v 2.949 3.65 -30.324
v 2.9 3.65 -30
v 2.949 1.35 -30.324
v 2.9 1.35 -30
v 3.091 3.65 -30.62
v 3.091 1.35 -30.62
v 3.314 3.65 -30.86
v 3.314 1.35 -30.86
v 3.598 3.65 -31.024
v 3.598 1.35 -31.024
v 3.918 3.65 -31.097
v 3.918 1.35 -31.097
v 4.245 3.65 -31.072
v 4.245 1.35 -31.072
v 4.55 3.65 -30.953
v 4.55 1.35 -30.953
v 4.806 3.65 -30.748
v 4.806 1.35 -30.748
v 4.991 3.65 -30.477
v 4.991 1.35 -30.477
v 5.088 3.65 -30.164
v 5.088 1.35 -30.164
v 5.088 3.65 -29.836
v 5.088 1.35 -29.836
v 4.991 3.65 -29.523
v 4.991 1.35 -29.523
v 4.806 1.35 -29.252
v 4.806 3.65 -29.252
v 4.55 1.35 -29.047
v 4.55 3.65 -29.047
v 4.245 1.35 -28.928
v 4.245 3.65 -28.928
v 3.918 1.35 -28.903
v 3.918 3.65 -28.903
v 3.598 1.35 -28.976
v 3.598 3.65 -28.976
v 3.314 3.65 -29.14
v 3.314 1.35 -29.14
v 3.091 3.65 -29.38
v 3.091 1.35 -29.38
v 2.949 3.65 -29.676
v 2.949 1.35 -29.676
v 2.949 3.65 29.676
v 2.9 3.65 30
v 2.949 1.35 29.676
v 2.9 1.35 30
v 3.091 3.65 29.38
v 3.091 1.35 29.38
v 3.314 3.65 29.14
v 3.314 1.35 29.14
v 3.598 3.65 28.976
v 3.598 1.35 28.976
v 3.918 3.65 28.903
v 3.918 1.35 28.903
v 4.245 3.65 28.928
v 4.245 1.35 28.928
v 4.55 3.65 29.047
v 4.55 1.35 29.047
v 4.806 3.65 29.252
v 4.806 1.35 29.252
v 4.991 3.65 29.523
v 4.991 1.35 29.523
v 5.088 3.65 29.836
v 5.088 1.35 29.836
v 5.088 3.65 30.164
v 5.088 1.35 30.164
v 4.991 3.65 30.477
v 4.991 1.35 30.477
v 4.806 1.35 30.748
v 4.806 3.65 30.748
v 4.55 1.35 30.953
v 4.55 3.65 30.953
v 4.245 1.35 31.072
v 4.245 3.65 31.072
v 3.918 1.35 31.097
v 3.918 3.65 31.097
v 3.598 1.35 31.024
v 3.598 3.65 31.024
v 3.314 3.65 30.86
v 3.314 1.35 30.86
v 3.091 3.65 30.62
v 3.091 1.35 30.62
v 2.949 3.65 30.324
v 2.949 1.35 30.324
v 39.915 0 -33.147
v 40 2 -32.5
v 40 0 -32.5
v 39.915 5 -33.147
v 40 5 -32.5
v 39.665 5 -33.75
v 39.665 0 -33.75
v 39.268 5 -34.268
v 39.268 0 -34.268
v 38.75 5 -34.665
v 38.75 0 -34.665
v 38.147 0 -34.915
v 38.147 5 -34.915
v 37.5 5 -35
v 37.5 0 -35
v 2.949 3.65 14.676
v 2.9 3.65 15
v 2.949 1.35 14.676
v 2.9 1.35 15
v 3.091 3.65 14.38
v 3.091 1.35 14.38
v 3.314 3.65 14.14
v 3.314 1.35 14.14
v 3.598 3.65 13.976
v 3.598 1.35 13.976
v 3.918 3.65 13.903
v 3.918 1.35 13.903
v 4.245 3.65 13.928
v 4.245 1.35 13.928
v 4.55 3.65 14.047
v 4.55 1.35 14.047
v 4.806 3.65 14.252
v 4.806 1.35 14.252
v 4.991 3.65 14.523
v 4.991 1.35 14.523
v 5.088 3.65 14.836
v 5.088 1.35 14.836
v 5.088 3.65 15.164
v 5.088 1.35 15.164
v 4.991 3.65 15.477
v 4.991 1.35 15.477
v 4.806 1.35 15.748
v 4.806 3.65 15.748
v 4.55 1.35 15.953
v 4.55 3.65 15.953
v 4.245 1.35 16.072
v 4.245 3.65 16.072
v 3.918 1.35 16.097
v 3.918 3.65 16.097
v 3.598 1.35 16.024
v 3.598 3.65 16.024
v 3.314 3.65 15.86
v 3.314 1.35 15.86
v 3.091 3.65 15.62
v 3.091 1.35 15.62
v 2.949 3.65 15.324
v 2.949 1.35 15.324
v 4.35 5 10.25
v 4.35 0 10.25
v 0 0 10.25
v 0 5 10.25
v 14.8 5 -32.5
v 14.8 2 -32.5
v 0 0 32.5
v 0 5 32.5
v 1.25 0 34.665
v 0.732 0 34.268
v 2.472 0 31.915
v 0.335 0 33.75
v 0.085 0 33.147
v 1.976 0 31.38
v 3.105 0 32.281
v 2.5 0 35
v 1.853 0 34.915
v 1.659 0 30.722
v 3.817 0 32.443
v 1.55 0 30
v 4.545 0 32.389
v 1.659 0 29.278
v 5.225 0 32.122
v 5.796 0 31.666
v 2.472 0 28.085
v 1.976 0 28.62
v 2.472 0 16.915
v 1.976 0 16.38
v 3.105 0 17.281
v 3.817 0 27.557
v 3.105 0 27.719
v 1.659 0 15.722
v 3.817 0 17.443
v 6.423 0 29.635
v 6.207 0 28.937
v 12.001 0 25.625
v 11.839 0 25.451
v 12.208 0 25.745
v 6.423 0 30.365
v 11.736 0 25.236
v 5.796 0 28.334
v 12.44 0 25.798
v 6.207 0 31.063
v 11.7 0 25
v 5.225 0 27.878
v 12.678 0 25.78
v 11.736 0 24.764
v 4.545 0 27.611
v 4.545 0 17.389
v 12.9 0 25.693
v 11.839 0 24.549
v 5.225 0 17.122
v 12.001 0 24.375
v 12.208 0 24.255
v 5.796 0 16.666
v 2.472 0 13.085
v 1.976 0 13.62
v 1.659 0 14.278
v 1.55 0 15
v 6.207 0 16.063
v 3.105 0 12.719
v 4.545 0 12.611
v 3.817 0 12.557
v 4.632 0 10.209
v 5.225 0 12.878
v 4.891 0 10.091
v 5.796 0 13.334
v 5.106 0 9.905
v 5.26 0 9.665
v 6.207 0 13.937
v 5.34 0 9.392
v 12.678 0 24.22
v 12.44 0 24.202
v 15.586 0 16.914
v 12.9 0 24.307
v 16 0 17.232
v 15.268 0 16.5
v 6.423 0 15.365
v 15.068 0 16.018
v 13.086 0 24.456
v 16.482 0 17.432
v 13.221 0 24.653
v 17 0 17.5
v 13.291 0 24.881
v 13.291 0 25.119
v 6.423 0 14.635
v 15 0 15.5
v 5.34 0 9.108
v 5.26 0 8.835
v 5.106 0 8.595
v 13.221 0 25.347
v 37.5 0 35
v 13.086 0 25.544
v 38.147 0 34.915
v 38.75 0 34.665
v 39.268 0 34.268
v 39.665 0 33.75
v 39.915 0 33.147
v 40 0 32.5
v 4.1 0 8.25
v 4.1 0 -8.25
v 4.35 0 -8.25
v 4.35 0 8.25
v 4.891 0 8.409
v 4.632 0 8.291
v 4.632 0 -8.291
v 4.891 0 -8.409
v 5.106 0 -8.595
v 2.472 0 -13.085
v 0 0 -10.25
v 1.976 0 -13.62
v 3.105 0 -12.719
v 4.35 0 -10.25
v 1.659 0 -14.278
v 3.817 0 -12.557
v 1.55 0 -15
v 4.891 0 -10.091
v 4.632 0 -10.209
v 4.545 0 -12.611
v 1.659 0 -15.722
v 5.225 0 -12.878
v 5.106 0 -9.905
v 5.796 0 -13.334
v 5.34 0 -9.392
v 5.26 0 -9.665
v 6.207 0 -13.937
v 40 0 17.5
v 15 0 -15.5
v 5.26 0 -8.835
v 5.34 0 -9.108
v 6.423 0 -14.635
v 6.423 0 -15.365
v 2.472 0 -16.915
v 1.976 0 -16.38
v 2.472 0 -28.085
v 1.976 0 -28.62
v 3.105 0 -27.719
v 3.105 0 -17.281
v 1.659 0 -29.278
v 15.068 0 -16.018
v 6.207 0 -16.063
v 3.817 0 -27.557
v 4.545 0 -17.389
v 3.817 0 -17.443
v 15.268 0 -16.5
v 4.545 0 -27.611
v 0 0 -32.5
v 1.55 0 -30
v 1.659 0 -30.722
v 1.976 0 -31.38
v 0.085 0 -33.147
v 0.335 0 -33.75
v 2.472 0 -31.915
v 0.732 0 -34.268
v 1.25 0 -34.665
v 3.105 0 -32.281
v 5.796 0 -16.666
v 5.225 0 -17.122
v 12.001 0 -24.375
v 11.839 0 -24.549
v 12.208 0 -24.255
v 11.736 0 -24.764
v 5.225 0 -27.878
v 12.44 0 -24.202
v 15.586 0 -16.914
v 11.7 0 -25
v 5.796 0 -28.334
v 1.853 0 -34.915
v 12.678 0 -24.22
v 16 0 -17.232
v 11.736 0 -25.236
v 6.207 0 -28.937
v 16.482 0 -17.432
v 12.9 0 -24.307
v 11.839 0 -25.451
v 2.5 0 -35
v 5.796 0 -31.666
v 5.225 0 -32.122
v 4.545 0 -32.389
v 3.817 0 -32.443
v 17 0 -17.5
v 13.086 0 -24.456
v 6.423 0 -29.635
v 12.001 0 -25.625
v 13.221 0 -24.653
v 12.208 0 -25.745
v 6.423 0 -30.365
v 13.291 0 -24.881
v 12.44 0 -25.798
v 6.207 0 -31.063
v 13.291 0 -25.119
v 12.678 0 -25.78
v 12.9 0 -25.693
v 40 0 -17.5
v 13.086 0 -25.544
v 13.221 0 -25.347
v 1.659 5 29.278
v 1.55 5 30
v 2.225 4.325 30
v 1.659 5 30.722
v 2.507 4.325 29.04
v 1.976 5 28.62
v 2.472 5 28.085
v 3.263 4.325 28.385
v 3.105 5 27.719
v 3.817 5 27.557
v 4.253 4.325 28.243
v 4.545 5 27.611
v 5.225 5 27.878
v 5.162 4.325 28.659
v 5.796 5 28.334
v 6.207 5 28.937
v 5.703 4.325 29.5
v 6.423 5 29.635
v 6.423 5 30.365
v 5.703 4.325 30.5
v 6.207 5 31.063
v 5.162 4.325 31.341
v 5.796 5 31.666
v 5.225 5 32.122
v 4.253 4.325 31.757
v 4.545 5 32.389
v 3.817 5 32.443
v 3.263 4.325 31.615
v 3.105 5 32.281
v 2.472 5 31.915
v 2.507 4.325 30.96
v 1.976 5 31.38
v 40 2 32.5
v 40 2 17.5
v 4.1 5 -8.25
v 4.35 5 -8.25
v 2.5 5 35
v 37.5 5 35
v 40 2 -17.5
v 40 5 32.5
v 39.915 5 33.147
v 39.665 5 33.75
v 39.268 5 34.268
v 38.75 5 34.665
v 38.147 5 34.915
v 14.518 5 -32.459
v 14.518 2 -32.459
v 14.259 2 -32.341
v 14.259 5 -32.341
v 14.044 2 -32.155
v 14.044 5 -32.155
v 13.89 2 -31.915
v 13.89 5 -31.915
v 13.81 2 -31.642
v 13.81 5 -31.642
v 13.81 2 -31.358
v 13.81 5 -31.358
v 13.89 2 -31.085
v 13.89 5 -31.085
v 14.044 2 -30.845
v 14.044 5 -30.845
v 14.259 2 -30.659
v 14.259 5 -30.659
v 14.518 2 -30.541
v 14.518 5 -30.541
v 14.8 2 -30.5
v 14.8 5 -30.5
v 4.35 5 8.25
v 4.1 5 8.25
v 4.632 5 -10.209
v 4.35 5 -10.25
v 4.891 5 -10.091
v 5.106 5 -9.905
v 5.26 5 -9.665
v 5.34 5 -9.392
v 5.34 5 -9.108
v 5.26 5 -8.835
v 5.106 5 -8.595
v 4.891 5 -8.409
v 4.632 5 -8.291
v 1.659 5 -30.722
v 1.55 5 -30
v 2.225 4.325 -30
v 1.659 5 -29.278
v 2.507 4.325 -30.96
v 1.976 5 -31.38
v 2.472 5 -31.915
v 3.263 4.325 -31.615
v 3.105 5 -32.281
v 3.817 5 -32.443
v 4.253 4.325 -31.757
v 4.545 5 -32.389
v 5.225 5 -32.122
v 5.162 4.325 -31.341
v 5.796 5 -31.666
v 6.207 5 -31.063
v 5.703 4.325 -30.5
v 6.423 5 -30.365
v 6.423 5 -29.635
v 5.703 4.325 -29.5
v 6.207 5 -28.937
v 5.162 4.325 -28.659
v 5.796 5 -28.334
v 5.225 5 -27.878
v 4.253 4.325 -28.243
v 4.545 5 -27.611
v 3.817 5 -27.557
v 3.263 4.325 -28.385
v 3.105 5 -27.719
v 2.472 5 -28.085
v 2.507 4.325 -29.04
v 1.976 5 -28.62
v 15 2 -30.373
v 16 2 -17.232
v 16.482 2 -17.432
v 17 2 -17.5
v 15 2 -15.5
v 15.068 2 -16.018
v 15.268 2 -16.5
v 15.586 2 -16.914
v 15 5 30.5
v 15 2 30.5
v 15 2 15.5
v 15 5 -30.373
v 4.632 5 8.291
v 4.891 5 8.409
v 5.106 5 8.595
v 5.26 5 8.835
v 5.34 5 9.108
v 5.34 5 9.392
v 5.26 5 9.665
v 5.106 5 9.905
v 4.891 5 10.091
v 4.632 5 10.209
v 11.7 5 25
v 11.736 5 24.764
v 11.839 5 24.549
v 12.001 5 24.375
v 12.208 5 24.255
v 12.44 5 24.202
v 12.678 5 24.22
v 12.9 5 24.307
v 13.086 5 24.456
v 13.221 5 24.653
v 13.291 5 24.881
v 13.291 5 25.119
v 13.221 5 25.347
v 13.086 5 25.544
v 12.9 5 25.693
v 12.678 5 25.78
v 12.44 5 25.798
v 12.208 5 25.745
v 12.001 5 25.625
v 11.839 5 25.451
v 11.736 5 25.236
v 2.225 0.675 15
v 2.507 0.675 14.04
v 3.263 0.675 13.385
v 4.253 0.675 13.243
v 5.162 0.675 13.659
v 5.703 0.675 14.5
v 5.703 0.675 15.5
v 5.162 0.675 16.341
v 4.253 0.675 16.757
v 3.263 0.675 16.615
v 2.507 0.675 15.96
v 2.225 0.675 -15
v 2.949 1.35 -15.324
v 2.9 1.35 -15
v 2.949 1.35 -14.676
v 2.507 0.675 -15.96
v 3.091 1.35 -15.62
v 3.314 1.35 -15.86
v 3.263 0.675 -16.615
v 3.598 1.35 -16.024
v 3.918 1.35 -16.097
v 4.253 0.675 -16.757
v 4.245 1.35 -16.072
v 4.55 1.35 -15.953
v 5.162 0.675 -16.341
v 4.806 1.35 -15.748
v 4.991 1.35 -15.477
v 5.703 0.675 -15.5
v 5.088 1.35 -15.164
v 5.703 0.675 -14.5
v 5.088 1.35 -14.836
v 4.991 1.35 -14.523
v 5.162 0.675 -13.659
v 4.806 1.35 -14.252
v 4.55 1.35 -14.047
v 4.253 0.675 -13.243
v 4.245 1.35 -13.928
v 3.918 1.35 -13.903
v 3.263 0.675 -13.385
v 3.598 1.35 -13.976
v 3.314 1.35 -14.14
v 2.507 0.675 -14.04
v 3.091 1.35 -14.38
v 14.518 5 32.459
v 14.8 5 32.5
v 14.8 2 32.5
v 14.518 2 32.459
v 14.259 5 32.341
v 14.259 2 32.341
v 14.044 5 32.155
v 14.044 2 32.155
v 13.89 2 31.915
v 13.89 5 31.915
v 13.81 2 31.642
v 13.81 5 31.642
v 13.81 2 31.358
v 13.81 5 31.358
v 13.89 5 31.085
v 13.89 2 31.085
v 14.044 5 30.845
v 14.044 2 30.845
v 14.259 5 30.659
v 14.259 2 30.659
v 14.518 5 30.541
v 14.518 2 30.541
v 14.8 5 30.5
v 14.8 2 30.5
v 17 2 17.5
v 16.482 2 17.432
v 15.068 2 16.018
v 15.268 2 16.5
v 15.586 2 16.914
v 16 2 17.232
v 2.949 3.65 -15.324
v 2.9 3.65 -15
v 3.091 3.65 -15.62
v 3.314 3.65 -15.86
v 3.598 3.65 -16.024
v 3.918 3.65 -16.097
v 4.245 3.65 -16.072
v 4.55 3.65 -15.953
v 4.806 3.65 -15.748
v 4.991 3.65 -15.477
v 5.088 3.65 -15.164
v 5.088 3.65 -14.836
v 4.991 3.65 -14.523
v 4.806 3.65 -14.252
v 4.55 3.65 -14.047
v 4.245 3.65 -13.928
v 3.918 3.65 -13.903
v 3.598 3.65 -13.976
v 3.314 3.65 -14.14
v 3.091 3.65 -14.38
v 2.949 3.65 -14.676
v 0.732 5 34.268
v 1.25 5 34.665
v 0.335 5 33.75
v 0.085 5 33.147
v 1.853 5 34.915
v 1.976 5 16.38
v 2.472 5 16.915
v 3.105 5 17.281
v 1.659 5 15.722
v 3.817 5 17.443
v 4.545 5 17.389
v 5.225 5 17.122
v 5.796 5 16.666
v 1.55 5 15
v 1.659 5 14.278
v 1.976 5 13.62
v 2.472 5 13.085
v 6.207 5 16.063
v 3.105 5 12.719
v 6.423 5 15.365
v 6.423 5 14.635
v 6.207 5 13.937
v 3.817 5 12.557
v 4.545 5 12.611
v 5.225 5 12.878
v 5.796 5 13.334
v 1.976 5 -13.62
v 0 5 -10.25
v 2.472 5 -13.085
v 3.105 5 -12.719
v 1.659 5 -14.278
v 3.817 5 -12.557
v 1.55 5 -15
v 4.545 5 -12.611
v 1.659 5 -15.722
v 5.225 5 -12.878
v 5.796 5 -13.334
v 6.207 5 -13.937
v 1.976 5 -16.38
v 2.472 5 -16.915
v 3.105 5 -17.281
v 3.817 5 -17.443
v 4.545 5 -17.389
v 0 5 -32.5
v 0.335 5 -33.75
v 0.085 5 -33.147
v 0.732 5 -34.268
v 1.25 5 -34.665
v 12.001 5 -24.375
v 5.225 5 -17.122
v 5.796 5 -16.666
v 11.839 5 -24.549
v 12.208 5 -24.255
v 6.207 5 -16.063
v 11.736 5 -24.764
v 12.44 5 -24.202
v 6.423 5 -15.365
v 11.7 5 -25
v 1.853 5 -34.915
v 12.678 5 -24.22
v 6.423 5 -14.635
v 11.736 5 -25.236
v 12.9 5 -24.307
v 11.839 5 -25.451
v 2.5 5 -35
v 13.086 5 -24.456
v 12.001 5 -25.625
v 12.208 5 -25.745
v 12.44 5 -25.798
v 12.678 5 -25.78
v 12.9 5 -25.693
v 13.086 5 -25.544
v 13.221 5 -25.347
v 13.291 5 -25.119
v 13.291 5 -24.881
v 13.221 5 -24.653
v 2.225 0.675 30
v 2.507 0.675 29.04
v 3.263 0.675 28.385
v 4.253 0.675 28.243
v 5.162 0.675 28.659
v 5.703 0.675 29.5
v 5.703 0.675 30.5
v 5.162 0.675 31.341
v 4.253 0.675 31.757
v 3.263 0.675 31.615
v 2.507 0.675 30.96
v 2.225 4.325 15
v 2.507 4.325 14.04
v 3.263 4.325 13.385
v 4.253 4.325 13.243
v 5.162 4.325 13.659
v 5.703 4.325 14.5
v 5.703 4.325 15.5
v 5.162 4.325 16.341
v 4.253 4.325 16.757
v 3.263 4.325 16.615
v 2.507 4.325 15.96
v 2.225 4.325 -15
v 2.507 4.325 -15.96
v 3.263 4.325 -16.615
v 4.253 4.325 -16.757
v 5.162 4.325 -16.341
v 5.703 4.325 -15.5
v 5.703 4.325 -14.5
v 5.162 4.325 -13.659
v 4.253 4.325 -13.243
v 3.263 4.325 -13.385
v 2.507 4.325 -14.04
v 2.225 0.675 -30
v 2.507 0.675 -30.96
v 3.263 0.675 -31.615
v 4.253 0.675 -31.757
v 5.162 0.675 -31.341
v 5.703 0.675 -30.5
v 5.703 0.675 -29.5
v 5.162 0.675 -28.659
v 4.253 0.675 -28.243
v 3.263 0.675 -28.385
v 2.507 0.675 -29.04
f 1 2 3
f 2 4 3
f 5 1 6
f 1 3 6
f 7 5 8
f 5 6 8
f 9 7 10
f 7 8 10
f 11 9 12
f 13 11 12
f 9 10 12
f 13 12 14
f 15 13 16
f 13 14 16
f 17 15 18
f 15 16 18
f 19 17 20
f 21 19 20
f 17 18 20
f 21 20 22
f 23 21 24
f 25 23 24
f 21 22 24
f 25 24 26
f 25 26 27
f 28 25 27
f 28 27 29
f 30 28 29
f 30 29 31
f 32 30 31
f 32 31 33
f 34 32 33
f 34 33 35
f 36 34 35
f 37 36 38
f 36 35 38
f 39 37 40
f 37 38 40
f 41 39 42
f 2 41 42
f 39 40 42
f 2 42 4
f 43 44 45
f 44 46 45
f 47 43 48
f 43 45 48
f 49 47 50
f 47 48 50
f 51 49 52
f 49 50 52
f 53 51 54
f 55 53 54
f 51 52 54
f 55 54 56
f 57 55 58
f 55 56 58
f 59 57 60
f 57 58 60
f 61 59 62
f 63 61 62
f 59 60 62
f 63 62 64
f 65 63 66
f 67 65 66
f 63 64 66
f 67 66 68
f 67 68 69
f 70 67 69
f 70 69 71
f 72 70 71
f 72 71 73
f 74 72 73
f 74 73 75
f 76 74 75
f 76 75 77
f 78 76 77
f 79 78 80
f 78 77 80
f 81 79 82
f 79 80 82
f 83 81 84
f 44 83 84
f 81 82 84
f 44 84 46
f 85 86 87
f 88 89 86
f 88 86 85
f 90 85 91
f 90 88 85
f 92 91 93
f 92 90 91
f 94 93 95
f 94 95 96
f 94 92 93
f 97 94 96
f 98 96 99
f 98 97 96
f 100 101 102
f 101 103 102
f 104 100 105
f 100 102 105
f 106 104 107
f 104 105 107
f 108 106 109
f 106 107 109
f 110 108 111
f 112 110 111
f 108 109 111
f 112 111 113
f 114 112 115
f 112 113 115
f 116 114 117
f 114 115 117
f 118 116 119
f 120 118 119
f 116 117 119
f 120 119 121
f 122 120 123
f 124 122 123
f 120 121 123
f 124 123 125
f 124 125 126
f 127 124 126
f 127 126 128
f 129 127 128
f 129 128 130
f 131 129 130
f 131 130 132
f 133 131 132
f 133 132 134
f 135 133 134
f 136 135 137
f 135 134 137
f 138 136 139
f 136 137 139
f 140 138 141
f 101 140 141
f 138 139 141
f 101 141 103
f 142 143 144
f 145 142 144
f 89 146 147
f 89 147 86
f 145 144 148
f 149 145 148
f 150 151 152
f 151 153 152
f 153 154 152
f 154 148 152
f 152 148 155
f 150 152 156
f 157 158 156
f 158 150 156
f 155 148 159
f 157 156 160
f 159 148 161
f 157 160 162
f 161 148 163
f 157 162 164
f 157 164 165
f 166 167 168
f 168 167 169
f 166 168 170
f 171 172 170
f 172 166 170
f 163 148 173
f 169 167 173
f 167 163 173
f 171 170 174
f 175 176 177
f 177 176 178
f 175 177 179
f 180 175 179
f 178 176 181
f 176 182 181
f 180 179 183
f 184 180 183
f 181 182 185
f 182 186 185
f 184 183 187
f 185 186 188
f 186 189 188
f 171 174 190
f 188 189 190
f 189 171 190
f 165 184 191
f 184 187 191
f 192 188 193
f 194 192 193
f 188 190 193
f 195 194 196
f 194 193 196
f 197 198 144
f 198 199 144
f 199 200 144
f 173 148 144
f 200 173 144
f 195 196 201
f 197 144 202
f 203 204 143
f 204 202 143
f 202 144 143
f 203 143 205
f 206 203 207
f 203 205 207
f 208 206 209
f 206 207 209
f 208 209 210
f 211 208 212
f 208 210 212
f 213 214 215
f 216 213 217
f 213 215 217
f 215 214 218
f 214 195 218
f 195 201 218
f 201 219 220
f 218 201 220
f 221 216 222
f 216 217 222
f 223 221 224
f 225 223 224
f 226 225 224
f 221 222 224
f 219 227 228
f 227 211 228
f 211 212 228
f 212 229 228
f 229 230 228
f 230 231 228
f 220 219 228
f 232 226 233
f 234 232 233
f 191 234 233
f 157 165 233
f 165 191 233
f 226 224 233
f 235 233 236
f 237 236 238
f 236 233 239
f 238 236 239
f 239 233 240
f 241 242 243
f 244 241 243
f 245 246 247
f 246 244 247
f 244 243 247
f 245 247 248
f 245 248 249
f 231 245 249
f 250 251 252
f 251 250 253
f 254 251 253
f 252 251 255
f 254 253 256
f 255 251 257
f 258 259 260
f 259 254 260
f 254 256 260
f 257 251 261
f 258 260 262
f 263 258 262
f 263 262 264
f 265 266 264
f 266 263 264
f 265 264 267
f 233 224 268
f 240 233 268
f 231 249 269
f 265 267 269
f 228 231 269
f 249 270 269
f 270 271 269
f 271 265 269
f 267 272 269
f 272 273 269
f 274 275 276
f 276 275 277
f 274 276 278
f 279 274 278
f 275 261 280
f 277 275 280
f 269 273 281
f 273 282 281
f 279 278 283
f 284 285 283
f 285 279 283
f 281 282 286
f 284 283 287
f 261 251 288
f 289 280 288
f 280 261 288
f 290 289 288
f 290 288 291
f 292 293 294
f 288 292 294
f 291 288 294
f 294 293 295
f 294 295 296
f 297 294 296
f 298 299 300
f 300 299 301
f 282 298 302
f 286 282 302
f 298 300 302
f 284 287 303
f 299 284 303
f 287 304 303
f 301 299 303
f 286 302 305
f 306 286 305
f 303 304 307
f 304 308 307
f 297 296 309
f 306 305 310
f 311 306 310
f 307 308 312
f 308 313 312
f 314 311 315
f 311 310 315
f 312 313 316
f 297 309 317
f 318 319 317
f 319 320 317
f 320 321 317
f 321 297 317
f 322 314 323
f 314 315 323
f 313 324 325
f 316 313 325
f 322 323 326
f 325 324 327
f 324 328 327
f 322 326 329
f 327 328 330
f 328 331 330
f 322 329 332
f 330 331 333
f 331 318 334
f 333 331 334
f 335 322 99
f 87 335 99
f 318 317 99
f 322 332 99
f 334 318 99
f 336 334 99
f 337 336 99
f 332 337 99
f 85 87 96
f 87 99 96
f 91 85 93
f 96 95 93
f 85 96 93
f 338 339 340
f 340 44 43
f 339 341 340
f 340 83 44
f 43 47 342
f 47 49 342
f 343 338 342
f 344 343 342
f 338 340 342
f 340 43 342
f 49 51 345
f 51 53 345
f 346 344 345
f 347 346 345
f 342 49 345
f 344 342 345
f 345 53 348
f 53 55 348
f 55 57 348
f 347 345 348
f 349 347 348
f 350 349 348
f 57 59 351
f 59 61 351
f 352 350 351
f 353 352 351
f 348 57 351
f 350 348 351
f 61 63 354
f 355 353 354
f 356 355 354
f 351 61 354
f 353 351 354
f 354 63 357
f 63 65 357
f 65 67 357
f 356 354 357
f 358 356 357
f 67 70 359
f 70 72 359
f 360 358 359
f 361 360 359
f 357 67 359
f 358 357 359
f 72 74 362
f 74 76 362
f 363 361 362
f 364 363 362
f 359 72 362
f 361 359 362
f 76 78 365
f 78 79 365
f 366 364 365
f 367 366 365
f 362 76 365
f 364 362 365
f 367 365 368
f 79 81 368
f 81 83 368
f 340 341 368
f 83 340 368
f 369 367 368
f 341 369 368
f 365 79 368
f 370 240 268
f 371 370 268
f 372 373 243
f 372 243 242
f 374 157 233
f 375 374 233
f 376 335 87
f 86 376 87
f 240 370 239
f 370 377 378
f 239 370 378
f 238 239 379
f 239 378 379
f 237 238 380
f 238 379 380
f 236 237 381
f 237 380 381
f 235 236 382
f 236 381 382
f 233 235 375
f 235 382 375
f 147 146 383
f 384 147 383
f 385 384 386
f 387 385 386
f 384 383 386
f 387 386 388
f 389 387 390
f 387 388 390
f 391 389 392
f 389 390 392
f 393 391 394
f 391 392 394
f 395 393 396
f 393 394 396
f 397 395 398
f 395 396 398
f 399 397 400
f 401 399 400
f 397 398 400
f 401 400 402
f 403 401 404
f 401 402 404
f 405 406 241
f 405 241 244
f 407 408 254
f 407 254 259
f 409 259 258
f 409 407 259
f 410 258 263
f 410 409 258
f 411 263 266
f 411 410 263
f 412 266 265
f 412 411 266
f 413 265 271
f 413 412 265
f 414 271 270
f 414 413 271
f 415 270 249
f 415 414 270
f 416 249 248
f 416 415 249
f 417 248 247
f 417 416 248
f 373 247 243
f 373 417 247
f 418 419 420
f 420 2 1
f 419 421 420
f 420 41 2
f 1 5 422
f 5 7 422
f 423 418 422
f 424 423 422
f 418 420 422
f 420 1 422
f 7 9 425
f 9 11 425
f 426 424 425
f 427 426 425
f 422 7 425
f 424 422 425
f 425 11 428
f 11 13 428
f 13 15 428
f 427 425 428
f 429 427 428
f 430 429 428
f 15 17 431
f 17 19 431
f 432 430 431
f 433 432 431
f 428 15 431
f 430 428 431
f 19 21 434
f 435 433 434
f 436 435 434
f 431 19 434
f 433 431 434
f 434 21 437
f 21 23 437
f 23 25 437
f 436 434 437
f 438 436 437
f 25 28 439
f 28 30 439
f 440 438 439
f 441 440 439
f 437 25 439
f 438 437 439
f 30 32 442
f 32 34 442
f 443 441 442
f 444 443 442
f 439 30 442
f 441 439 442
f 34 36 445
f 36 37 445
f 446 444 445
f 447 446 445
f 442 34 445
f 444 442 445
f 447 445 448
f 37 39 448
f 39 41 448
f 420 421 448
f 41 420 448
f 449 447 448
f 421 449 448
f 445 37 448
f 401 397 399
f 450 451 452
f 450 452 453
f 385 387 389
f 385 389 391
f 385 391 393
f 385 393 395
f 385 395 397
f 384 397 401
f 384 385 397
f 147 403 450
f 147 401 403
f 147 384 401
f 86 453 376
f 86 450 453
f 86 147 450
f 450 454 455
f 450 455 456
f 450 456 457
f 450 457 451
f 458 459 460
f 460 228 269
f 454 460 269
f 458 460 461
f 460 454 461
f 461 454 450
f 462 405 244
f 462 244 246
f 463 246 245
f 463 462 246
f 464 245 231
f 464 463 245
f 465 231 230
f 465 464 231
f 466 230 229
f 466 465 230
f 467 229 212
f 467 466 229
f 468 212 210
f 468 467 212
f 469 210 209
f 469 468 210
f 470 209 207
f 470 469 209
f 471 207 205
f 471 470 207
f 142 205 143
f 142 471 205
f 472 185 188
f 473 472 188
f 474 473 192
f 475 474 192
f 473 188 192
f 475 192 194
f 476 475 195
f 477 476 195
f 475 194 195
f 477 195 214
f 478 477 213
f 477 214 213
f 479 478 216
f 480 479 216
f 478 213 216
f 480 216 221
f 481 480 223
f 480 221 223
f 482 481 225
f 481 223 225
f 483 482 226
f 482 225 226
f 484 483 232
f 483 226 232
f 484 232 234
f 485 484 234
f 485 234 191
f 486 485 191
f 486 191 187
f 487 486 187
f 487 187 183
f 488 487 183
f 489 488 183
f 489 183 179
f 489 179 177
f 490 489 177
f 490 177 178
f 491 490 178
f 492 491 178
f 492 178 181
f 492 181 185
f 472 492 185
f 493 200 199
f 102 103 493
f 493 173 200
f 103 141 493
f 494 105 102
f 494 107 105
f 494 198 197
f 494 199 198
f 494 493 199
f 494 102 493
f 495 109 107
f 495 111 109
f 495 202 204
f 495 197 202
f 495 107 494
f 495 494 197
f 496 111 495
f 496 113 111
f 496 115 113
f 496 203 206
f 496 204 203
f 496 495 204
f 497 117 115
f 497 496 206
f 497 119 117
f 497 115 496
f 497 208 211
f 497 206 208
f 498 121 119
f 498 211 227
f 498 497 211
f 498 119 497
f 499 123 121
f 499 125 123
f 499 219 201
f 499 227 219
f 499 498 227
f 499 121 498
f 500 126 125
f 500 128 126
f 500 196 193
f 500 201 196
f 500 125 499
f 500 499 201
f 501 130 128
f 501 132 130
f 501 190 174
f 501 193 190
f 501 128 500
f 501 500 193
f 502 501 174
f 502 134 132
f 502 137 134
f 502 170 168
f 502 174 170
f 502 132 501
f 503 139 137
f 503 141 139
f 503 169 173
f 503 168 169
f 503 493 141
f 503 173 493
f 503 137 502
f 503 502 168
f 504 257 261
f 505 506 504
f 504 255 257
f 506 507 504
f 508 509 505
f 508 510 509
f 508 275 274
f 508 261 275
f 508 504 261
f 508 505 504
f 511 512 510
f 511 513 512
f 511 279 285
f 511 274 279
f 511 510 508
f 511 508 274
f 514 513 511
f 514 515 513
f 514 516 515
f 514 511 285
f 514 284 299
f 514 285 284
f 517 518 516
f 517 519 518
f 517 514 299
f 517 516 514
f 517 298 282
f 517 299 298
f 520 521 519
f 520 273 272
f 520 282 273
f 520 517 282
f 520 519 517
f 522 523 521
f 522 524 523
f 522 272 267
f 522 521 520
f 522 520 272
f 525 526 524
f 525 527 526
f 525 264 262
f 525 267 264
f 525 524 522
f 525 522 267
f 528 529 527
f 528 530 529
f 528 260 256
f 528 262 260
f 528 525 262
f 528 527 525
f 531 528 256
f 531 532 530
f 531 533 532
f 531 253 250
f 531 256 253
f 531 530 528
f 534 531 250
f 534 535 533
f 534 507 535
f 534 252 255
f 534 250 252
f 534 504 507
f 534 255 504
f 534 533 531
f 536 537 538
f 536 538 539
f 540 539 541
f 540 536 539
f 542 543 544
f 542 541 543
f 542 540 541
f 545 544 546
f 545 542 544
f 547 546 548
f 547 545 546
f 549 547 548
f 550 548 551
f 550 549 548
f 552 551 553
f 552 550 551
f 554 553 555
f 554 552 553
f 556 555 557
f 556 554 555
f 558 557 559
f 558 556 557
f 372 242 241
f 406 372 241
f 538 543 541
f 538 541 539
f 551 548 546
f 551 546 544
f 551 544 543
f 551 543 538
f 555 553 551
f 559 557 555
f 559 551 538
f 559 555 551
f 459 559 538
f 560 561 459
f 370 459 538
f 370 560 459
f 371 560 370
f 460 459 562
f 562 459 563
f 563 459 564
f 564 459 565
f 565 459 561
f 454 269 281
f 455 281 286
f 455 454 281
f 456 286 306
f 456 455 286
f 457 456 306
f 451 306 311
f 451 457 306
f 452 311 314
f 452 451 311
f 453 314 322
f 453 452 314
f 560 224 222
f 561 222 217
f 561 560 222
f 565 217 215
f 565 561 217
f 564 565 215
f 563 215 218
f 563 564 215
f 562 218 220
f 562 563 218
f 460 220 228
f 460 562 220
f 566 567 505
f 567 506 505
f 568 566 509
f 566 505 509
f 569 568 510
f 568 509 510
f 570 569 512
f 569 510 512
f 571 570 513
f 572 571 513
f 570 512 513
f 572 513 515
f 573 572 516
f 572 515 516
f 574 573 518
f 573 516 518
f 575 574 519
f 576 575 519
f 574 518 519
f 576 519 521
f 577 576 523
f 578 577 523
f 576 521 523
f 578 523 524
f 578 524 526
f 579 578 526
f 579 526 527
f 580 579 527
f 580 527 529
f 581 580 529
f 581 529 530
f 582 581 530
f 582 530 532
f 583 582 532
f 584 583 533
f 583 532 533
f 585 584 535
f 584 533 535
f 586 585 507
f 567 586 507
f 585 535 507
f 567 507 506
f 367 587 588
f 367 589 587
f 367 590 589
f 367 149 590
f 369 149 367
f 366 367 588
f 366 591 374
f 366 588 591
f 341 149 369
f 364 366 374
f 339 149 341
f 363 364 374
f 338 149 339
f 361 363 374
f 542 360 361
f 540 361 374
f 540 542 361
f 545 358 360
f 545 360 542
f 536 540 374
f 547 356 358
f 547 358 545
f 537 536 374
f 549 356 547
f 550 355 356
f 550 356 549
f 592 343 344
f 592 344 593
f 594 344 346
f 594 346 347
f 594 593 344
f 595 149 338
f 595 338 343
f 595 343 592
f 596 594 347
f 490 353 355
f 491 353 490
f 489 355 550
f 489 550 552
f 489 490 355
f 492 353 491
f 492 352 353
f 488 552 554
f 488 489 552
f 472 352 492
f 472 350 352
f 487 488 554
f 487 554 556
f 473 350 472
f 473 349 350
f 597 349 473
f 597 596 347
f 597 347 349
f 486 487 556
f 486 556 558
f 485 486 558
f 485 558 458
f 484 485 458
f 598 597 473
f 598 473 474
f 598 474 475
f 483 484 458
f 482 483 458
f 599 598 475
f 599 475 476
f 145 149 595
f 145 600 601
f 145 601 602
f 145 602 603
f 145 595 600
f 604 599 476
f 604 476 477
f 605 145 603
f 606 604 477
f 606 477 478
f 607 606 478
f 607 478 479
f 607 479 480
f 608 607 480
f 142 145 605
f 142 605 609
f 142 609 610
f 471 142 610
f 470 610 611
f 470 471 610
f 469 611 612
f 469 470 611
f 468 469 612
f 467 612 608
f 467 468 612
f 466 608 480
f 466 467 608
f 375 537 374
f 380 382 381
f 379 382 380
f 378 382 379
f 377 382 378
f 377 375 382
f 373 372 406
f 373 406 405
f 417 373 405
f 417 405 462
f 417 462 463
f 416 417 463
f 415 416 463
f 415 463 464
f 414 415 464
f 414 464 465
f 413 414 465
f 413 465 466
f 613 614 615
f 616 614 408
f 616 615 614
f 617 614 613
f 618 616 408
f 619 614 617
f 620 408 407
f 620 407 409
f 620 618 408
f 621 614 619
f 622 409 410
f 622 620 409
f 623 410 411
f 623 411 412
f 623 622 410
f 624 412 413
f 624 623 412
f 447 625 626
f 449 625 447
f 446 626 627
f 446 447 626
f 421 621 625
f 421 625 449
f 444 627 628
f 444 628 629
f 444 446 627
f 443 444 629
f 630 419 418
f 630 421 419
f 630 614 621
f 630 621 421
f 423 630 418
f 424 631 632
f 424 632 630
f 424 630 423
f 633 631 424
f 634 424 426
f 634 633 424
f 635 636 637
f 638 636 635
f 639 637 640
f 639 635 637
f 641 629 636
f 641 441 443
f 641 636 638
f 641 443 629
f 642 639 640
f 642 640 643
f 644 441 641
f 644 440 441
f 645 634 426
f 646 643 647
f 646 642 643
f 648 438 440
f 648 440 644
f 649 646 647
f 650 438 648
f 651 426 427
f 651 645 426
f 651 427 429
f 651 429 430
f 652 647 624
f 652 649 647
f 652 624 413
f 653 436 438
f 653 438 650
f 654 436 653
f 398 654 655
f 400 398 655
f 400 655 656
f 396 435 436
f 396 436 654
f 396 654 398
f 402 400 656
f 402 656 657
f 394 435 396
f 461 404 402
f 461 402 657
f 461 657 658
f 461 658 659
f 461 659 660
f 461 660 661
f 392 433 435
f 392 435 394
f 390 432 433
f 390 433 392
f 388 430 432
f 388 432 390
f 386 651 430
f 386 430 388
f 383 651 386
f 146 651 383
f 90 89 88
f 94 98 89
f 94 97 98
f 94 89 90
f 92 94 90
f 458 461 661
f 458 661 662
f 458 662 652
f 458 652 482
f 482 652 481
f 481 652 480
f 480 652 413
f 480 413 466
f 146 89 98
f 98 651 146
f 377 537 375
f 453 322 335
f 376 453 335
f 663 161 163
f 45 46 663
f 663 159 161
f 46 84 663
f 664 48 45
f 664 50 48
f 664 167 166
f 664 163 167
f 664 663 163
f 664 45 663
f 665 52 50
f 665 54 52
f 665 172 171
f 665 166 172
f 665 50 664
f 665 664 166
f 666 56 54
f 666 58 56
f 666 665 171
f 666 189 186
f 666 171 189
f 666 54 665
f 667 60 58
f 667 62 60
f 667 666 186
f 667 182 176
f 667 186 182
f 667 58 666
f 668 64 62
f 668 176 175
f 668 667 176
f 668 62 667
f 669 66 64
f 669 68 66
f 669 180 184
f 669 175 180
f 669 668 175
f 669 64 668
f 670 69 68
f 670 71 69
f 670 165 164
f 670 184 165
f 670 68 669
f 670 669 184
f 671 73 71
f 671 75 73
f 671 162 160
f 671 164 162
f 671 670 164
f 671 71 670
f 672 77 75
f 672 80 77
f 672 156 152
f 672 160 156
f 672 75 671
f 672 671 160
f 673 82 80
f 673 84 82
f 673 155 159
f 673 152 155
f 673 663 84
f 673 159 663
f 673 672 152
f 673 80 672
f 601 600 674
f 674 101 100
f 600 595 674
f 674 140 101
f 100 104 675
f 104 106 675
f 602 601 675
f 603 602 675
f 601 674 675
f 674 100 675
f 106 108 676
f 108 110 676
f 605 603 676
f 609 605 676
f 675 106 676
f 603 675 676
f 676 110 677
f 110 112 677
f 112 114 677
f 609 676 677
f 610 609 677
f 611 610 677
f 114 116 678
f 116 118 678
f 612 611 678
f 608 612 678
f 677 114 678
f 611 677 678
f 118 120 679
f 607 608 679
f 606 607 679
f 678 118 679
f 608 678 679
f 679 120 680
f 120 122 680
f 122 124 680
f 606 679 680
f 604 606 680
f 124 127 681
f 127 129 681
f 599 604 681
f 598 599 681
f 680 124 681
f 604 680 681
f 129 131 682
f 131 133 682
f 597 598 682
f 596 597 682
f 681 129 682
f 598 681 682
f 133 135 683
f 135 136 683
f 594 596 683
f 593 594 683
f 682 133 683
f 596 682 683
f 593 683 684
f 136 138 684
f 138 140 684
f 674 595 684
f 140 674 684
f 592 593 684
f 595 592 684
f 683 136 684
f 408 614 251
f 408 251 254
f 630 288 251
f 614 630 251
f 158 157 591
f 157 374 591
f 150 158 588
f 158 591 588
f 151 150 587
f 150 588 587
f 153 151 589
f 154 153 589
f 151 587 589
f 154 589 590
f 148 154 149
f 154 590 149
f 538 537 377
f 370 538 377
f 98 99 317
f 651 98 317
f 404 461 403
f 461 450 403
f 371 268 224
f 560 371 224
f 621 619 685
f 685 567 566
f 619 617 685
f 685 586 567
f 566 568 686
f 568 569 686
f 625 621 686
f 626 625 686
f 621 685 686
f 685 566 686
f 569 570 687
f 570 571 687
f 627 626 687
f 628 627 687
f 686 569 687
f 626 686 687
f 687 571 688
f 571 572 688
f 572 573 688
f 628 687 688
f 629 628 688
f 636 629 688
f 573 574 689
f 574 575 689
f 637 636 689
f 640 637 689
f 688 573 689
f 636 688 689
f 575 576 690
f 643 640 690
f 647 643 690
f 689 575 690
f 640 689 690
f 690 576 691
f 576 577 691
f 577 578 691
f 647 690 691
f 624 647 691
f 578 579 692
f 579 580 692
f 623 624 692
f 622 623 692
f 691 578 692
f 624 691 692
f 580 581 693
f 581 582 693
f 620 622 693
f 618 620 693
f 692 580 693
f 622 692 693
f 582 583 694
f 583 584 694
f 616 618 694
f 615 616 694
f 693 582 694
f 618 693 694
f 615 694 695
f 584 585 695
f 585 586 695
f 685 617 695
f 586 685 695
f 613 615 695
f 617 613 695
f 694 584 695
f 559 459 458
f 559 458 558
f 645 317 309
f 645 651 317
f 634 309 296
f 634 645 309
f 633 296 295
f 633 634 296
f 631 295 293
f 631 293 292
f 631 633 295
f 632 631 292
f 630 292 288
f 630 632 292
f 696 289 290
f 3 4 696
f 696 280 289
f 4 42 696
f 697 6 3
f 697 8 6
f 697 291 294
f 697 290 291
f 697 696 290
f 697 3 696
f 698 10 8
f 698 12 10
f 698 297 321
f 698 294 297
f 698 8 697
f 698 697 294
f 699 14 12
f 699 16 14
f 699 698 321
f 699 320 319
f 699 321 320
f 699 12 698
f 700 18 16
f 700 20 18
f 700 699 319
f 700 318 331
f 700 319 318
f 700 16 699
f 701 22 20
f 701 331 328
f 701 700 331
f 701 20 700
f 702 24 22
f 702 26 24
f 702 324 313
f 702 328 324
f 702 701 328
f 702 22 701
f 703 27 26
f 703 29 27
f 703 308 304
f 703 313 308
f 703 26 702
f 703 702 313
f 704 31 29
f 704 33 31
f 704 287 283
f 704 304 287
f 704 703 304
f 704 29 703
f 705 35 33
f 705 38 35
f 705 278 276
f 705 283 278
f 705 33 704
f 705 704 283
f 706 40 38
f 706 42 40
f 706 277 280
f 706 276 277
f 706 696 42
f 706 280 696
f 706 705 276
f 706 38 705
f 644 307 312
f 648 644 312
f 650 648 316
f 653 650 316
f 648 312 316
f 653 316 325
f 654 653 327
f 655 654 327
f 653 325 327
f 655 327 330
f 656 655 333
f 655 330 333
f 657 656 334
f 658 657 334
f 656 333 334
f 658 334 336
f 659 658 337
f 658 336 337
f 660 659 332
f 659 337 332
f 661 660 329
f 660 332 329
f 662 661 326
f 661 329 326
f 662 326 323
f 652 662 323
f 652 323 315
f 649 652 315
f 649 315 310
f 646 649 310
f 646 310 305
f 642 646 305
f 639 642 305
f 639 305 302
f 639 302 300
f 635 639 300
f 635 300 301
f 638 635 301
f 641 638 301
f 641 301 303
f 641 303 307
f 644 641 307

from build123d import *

# Parameters (mm, degrees)
BOSS_EXTRUDE1_DEPTH                                 = 5
FILLET1_R                                           = 2
FILLET2_R                                           = 2.5
CUT_EXTRUDE2_REACH                                  = 7
CSK_FOR_M2_COUNTERSUNK_FLAT_HEAD_SCREW1_D           = 2.2
CSK_FOR_M2_COUNTERSUNK_FLAT_HEAD_SCREW1_DEPTH       = 5
CSK_FOR_M2_COUNTERSUNK_FLAT_HEAD_SCREW1_CSINK_D     = 4.9
CSK_FOR_M2_COUNTERSUNK_FLAT_HEAD_SCREW1_CSINK_ANGLE = 90
M2_TAPPED_HOLE1_D                                   = 1.6
M2_TAPPED_HOLE1_DEPTH                               = 5
SKETCH9_W                                           = 25.2
SKETCH9_H                                           = 12.5
CUT_EXTRUDE3_DEPTH                                  = 1.25
CUT_EXTRUDE4_DEPTH                                  = 1.25
SKETCH11_W                                          = 25
SKETCH11_H                                          = 4.5
CUT_EXTRUDE5_DEPTH                                  = 1.25
BOSS_EXTRUDE2_DEPTH                                 = 1.25
CUT_EXTRUDE6_DEPTH                                  = 1.75


with BuildPart() as part:
    # Sketch1 → Boss-Extrude1 (new body)
    with BuildSketch(Plane(origin=(0, 0, 0), x_dir=(1, 0, 0), z_dir=(0, 1, 0))):
        Polygon((0, 35), (0, 10.25), (4.1, 10.25), (4.1, -10.25), (0, -10.25), (0, -35), (40, -35), (40, -17.5), (15, -17.5), (15, 17.5), (40, 17.5), (40, 35), align=None)
    extrude(amount=BOSS_EXTRUDE1_DEPTH)

    # Fillet1
    fillet1_edges = [part.edges().sort_by_distance(p)[0] for p in [
        (15, 2.5, -17.5),
        (15, 2.5, 17.5),
    ]]
    fillet(fillet1_edges, radius=FILLET1_R)

    # Fillet2
    fillet2_edges = [part.edges().sort_by_distance(p)[0] for p in [
        (0, 2.5, -35),
        (40, 2.5, -35),
        (40, 2.5, 35),
        (0, 2.5, 35),
    ]]
    fillet(fillet2_edges, radius=FILLET2_R)

    # Sketch3 → Cut-Extrude2 (cut, up to next)
    with BuildSketch(Plane(origin=(0, 5, 0), x_dir=(1, 0, 0), z_dir=(0, 1, 0)), mode=Mode.PRIVATE) as cut_extrude2_sk1:
        with BuildLine():
            Line((4.1, 10.25), (4.35, 10.25))
            ThreePointArc((4.35, 10.25), (5.35, 9.25), (4.35, 8.25))
            Line((4.35, 8.25), (4.1, 8.25))
            Line((4.1, 8.25), (4.1, 10.25))
        make_face()
    cut_extrude2_tool1 = extrude(cut_extrude2_sk1.sketch, amount=-CUT_EXTRUDE2_REACH, mode=Mode.PRIVATE) & part.part
    add(cut_extrude2_tool1.solids().sort_by_distance((4.641756, 5, -9.25))[0], mode=Mode.SUBTRACT)
    # Sketch3 → Cut-Extrude2 (cut, up to next)
    with BuildSketch(Plane(origin=(0, 5, 0), x_dir=(1, 0, 0), z_dir=(0, 1, 0)), mode=Mode.PRIVATE) as cut_extrude2_sk2:
        with BuildLine():
            Line((4.1, -10.25), (4.1, -8.25))
            Line((4.1, -8.25), (4.35, -8.25))
            ThreePointArc((4.35, -8.25), (5.35, -9.25), (4.35, -10.25))
            Line((4.35, -10.25), (4.1, -10.25))
        make_face()
    cut_extrude2_tool2 = extrude(cut_extrude2_sk2.sketch, amount=-CUT_EXTRUDE2_REACH, mode=Mode.PRIVATE) & part.part
    add(cut_extrude2_tool2.solids().sort_by_distance((4.641756, 5, 9.25))[0], mode=Mode.SUBTRACT)

    # CSK for M2 Countersunk Flat Head Screw1
    with Locations(Plane(origin=(0, 5, 0), x_dir=(1, 0, 0), z_dir=(0, 1, 0))):
        with Locations((4, 30), (4, 15), (4, -15), (4, -30)):
            csk_for_m2_countersunk_flat_head_screw1 = CounterSinkHole(CSK_FOR_M2_COUNTERSUNK_FLAT_HEAD_SCREW1_D / 2, CSK_FOR_M2_COUNTERSUNK_FLAT_HEAD_SCREW1_CSINK_D / 2, depth=CSK_FOR_M2_COUNTERSUNK_FLAT_HEAD_SCREW1_DEPTH, counter_sink_angle=CSK_FOR_M2_COUNTERSUNK_FLAT_HEAD_SCREW1_CSINK_ANGLE)

    # M2 Tapped Hole1
    with Locations(Plane(origin=(0, 5, 0), x_dir=(1, 0, 0), z_dir=(0, 1, 0))):
        with Locations((12.5, -25), (12.5, 25)):
            Hole(M2_TAPPED_HOLE1_D / 2, depth=M2_TAPPED_HOLE1_DEPTH)

    # Sketch9 → Cut-Extrude3 (cut)
    with BuildSketch(Plane(origin=(0, 5, 0), x_dir=(1, 0, 0), z_dir=(0, 1, 0))):
        with Locations((27.4, 26.25)):
            Rectangle(SKETCH9_W, SKETCH9_H)
        with Locations((27.4, -26.25)):
            Rectangle(SKETCH9_W, SKETCH9_H)
    extrude(amount=-CUT_EXTRUDE3_DEPTH, mode=Mode.SUBTRACT)

    # Sketch10 → Cut-Extrude4 (cut)
    with BuildSketch(Plane(origin=(0, 5, 0), x_dir=(1, 0, 0), z_dir=(0, 1, 0))):
        with BuildLine():
            Line((14.8, 22), (14.8, 20))
            ThreePointArc((14.8, 20), (13.8, 21), (14.8, 22))
        make_face()
        with BuildLine():
            Line((14.8, 30.5), (14.8, 32.5))
            ThreePointArc((14.8, 32.5), (13.8, 31.5), (14.8, 30.5))
        make_face()
    cut_extrude4 = extrude(amount=-CUT_EXTRUDE4_DEPTH, mode=Mode.SUBTRACT)

    # Mirror1: CSK for M2 Countersunk Flat Head Screw1 across plane
    add(csk_for_m2_countersunk_flat_head_screw1.mirror(Plane(origin=(0, 2.5, 0), x_dir=(0, 0, 1), z_dir=(0, -1, 0))), mode=Mode.SUBTRACT)

    # Mirror2: Cut-Extrude4 across plane
    add(cut_extrude4.mirror(Plane.XY), mode=Mode.SUBTRACT)

    # Sketch11 → Cut-Extrude5 (cut)
    with BuildSketch(Plane(origin=(0, 5, 0), x_dir=(1, 0, 0), z_dir=(0, 1, 0))):
        with Locations((27.5, 17.75)):
            Rectangle(SKETCH11_W, SKETCH11_H)
        with Locations((27.5, -17.75)):
            Rectangle(SKETCH11_W, SKETCH11_H)
    extrude(amount=-CUT_EXTRUDE5_DEPTH, mode=Mode.SUBTRACT)

    # Sketch12 → Boss-Extrude2 (add)
    with BuildSketch(Plane(origin=(0, 3.75, 0), x_dir=(1, 0, 0), z_dir=(0, 1, 0))):
        with BuildLine():
            Line((14.8, 20), (15, 20))
            Line((15, 20), (15, 30.37258082))
            Line((15, 30.37258082), (14.8, 30.5))
            Line((14.8, 30.5), (14.8, 22))
            ThreePointArc((14.8, 22), (13.8, 21), (14.8, 20))
        make_face()
        with BuildLine():
            Line((14.8, -20), (15, -20))
            Line((15, -20), (15, -30.5))
            Line((15, -30.5), (14.8, -30.5))
            Line((14.8, -30.5), (14.8, -22))
            ThreePointArc((14.8, -22), (13.8, -21), (14.8, -20))
        make_face()
    extrude(amount=BOSS_EXTRUDE2_DEPTH)

    # Sketch13 → Cut-Extrude6 (cut)
    with BuildSketch(Plane(origin=(0, 3.75, 0), x_dir=(1, 0, 0), z_dir=(0, 1, 0))):
        with BuildLine():
            Line((14.8, 30.5), (15, 30.37258082))
            Line((15, 30.37258082), (15, 15.5))
            ThreePointArc((15, 15.5), (15.585786438, 16.914213562), (17, 17.5))
            Line((17, 17.5), (40, 17.5))
            Line((40, 17.5), (40, 32.5))
            Line((40, 32.5), (14.8, 32.5))
            ThreePointArc((14.8, 32.5), (13.8, 31.5), (14.8, 30.5))
        make_face()
        with BuildLine():
            Line((15, -15.5), (15, -30.5))
            Line((15, -30.5), (14.8, -30.5))
            ThreePointArc((14.8, -30.5), (13.8, -31.5), (14.8, -32.5))
            Line((14.8, -32.5), (40, -32.5))
            Line((40, -32.5), (40, -17.5))
            Line((40, -17.5), (17, -17.5))
            ThreePointArc((17, -17.5), (15.585786438, -16.914213562), (15, -15.5))
        make_face()
    extrude(amount=-CUT_EXTRUDE6_DEPTH, mode=Mode.SUBTRACT)


solid = part.part
